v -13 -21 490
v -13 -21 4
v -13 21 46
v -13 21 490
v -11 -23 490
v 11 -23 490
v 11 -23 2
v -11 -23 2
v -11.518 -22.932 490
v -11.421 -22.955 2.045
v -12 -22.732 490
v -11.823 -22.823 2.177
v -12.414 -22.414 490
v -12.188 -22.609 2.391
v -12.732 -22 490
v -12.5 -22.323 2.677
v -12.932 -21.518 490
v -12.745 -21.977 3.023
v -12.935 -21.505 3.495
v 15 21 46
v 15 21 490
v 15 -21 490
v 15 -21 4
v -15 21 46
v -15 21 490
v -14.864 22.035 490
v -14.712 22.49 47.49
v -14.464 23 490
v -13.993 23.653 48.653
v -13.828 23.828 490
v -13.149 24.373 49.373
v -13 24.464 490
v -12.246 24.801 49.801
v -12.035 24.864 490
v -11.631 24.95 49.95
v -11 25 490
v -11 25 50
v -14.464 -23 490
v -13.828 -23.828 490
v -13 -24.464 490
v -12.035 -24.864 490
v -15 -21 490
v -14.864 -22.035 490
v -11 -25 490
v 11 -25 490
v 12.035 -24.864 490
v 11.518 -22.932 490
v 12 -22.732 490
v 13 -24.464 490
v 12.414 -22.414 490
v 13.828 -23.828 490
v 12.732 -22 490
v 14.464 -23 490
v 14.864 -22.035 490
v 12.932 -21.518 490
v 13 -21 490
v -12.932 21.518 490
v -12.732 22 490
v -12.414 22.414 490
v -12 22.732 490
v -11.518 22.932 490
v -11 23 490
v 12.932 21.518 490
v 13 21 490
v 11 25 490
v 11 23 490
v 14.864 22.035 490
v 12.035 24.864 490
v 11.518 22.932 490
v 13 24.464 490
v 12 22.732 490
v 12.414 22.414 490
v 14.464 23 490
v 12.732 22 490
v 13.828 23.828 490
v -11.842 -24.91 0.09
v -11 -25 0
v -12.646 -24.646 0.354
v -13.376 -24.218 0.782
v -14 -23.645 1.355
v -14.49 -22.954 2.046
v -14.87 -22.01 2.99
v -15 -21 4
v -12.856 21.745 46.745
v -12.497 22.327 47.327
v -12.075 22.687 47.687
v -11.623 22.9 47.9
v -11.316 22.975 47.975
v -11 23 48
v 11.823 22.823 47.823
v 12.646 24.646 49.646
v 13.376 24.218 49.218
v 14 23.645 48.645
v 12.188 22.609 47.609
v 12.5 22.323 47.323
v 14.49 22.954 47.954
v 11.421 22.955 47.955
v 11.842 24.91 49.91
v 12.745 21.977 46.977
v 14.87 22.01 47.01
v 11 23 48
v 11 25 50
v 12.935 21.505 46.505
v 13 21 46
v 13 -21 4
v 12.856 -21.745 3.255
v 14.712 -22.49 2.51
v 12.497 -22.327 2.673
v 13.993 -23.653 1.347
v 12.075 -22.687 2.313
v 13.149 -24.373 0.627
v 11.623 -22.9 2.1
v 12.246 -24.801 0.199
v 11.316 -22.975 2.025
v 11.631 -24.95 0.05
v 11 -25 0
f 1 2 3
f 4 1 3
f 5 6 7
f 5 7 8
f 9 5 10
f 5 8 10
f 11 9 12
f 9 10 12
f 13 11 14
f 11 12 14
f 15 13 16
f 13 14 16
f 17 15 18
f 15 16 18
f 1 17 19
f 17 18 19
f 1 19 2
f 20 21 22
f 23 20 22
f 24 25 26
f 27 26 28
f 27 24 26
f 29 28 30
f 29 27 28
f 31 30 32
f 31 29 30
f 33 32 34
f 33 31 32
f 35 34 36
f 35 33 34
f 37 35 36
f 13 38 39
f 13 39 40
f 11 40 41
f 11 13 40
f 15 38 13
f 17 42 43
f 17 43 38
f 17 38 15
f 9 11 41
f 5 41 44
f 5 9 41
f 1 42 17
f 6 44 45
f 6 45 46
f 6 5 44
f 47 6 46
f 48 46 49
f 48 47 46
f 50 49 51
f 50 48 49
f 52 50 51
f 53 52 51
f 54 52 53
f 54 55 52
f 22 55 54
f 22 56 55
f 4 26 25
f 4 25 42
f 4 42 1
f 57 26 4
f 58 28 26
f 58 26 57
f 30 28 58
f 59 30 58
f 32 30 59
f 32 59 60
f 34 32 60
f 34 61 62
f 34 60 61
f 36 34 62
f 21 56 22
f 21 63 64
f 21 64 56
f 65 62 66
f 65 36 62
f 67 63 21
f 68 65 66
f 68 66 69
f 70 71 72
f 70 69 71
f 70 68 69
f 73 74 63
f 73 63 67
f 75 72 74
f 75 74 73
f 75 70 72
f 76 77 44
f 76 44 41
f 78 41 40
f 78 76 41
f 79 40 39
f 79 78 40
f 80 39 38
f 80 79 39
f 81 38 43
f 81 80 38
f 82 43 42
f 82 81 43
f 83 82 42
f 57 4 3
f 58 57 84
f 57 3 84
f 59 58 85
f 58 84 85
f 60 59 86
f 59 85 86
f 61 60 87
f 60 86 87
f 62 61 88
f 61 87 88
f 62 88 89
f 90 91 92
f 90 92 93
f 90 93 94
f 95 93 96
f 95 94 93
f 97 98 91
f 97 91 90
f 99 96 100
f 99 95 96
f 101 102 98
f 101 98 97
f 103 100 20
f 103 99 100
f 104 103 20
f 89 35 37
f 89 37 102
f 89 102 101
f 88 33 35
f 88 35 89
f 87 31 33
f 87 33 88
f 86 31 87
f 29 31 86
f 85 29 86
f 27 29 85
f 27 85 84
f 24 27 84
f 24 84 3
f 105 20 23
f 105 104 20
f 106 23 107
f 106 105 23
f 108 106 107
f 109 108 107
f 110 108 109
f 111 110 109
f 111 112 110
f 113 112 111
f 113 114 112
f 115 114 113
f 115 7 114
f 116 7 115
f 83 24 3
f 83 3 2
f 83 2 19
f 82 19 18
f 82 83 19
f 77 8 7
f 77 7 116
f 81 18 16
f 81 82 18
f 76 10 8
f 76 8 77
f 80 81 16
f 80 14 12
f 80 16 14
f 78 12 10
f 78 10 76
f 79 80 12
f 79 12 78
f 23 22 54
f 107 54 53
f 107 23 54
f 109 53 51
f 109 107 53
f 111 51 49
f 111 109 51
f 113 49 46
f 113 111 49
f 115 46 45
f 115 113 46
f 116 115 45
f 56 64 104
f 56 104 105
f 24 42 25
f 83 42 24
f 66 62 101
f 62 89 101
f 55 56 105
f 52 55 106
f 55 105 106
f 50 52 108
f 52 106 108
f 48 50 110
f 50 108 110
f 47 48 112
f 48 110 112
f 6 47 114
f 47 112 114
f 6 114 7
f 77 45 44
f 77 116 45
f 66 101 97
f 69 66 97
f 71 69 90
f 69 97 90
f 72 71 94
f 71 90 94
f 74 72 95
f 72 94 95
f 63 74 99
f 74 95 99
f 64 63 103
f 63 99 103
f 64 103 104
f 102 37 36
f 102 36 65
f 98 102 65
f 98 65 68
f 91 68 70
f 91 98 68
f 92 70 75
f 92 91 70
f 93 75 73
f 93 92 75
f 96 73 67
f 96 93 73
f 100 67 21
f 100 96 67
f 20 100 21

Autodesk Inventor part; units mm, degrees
ref_plane "Plano inicial" through (0, 0, 0) normal (0, 0, 1) x (1, 0, 0)
ref_plane "Plano final" through (0, 0, 490) normal (0, 0, 1) x (1, 0, 0)
sketch "Esboço" plane through (0, 0, 0) normal (0, 0, 1) x (1, 0, 0)
  line L0 (-15, -21) -> (-15, 21)
  line L1 (-11, 25) -> (11, 25)
  line L2 (15, 21) -> (15, -21)
  line L3 (11, -25) -> (-11, -25)
  arc A0 (-15, -21) -> (-11, -25) centre (-11, -21) ccw
  arc A1 (15, 21) -> (11, 25) centre (11, 21) ccw
  arc A2 (-11, 25) -> (-15, 21) centre (-11, 21) ccw
  arc A3 (11, -25) -> (15, -21) centre (11, -21) ccw
  arc A4 (-11, 23) -> (-13, 21) centre (-11, 21) ccw
  line L4 (-11, 23) -> (11, 23)
  arc A5 (13, 21) -> (11, 23) centre (11, 21) ccw
  line L5 (13, 21) -> (13, -21)
  arc A6 (11, -23) -> (13, -21) centre (11, -21) ccw
  line L6 (11, -23) -> (-11, -23)
  arc A7 (-13, -21) -> (-11, -23) centre (-11, -21) ccw
  line L7 (-13, -21) -> (-13, 21)
  line L8 (0, 36.1598) -> (0, -36.1598) construction
  line L9 (-22.1598, 0) -> (22.1598, 0) construction
  dimension "d7" = 4
  dimension "d9" = 30
  dimension "d11" = 50
  dimension "d12" = 2
  dimension "d15" = 15
  dimension "d16" = 25
extrude "Corpo" add sketch "Esboço" along normal up to surface (490 mm away) from surface at 0
sketch "Sketch3" plane through (0, 0, 0) normal (0, 0, 1) x (1, 0, 0)
  line L0 (0, 0) -> (10, 0)
ref_plane "Work Plane3" through (0, 0, 0) normal (0, -1, 0) x (1, 0, 0)
sketch "Sketch4" plane through (0, 0, 0) normal (0, -1, 0) x (1, 0, 0)
  line L0 (-2, 0) -> (12, 0)
  line L1 (-2, 490) -> (12, 490)
  dimension "d18" = 490
ref_plane "Plano de trabalho4" through (0, -25, 0) normal (0, 0.7071, -0.7071) x (1, 0, 0)
split "Dividir1" plane through (0, -25, 0) removes the side toward (0, 0.7071, -0.7071)
equation "\"d7\" = G_IR"
equation "\"d9\" = G_W"
equation "\"d11\" = G_H"
equation "\"d12\" = G_T"
equation "\"d15\" = 0.5 * d9"
equation "\"d16\" = 0.5 * d11"
equation "\"d3\" = G_L"
equation "\"G_W\" = 30"
equation "\"G_H\" = 50"
equation "\"G_T\" = 2"
equation "\"G_IR\" = 4"
equation "\"G_L\" = d18"
equation "\"G_OFFSET_START\" = 0"
equation "\"G_OFFSET_END\" = 0"
properties part number "ISO 4019 - 50x30x2 - 490" material "Aço, suave"
